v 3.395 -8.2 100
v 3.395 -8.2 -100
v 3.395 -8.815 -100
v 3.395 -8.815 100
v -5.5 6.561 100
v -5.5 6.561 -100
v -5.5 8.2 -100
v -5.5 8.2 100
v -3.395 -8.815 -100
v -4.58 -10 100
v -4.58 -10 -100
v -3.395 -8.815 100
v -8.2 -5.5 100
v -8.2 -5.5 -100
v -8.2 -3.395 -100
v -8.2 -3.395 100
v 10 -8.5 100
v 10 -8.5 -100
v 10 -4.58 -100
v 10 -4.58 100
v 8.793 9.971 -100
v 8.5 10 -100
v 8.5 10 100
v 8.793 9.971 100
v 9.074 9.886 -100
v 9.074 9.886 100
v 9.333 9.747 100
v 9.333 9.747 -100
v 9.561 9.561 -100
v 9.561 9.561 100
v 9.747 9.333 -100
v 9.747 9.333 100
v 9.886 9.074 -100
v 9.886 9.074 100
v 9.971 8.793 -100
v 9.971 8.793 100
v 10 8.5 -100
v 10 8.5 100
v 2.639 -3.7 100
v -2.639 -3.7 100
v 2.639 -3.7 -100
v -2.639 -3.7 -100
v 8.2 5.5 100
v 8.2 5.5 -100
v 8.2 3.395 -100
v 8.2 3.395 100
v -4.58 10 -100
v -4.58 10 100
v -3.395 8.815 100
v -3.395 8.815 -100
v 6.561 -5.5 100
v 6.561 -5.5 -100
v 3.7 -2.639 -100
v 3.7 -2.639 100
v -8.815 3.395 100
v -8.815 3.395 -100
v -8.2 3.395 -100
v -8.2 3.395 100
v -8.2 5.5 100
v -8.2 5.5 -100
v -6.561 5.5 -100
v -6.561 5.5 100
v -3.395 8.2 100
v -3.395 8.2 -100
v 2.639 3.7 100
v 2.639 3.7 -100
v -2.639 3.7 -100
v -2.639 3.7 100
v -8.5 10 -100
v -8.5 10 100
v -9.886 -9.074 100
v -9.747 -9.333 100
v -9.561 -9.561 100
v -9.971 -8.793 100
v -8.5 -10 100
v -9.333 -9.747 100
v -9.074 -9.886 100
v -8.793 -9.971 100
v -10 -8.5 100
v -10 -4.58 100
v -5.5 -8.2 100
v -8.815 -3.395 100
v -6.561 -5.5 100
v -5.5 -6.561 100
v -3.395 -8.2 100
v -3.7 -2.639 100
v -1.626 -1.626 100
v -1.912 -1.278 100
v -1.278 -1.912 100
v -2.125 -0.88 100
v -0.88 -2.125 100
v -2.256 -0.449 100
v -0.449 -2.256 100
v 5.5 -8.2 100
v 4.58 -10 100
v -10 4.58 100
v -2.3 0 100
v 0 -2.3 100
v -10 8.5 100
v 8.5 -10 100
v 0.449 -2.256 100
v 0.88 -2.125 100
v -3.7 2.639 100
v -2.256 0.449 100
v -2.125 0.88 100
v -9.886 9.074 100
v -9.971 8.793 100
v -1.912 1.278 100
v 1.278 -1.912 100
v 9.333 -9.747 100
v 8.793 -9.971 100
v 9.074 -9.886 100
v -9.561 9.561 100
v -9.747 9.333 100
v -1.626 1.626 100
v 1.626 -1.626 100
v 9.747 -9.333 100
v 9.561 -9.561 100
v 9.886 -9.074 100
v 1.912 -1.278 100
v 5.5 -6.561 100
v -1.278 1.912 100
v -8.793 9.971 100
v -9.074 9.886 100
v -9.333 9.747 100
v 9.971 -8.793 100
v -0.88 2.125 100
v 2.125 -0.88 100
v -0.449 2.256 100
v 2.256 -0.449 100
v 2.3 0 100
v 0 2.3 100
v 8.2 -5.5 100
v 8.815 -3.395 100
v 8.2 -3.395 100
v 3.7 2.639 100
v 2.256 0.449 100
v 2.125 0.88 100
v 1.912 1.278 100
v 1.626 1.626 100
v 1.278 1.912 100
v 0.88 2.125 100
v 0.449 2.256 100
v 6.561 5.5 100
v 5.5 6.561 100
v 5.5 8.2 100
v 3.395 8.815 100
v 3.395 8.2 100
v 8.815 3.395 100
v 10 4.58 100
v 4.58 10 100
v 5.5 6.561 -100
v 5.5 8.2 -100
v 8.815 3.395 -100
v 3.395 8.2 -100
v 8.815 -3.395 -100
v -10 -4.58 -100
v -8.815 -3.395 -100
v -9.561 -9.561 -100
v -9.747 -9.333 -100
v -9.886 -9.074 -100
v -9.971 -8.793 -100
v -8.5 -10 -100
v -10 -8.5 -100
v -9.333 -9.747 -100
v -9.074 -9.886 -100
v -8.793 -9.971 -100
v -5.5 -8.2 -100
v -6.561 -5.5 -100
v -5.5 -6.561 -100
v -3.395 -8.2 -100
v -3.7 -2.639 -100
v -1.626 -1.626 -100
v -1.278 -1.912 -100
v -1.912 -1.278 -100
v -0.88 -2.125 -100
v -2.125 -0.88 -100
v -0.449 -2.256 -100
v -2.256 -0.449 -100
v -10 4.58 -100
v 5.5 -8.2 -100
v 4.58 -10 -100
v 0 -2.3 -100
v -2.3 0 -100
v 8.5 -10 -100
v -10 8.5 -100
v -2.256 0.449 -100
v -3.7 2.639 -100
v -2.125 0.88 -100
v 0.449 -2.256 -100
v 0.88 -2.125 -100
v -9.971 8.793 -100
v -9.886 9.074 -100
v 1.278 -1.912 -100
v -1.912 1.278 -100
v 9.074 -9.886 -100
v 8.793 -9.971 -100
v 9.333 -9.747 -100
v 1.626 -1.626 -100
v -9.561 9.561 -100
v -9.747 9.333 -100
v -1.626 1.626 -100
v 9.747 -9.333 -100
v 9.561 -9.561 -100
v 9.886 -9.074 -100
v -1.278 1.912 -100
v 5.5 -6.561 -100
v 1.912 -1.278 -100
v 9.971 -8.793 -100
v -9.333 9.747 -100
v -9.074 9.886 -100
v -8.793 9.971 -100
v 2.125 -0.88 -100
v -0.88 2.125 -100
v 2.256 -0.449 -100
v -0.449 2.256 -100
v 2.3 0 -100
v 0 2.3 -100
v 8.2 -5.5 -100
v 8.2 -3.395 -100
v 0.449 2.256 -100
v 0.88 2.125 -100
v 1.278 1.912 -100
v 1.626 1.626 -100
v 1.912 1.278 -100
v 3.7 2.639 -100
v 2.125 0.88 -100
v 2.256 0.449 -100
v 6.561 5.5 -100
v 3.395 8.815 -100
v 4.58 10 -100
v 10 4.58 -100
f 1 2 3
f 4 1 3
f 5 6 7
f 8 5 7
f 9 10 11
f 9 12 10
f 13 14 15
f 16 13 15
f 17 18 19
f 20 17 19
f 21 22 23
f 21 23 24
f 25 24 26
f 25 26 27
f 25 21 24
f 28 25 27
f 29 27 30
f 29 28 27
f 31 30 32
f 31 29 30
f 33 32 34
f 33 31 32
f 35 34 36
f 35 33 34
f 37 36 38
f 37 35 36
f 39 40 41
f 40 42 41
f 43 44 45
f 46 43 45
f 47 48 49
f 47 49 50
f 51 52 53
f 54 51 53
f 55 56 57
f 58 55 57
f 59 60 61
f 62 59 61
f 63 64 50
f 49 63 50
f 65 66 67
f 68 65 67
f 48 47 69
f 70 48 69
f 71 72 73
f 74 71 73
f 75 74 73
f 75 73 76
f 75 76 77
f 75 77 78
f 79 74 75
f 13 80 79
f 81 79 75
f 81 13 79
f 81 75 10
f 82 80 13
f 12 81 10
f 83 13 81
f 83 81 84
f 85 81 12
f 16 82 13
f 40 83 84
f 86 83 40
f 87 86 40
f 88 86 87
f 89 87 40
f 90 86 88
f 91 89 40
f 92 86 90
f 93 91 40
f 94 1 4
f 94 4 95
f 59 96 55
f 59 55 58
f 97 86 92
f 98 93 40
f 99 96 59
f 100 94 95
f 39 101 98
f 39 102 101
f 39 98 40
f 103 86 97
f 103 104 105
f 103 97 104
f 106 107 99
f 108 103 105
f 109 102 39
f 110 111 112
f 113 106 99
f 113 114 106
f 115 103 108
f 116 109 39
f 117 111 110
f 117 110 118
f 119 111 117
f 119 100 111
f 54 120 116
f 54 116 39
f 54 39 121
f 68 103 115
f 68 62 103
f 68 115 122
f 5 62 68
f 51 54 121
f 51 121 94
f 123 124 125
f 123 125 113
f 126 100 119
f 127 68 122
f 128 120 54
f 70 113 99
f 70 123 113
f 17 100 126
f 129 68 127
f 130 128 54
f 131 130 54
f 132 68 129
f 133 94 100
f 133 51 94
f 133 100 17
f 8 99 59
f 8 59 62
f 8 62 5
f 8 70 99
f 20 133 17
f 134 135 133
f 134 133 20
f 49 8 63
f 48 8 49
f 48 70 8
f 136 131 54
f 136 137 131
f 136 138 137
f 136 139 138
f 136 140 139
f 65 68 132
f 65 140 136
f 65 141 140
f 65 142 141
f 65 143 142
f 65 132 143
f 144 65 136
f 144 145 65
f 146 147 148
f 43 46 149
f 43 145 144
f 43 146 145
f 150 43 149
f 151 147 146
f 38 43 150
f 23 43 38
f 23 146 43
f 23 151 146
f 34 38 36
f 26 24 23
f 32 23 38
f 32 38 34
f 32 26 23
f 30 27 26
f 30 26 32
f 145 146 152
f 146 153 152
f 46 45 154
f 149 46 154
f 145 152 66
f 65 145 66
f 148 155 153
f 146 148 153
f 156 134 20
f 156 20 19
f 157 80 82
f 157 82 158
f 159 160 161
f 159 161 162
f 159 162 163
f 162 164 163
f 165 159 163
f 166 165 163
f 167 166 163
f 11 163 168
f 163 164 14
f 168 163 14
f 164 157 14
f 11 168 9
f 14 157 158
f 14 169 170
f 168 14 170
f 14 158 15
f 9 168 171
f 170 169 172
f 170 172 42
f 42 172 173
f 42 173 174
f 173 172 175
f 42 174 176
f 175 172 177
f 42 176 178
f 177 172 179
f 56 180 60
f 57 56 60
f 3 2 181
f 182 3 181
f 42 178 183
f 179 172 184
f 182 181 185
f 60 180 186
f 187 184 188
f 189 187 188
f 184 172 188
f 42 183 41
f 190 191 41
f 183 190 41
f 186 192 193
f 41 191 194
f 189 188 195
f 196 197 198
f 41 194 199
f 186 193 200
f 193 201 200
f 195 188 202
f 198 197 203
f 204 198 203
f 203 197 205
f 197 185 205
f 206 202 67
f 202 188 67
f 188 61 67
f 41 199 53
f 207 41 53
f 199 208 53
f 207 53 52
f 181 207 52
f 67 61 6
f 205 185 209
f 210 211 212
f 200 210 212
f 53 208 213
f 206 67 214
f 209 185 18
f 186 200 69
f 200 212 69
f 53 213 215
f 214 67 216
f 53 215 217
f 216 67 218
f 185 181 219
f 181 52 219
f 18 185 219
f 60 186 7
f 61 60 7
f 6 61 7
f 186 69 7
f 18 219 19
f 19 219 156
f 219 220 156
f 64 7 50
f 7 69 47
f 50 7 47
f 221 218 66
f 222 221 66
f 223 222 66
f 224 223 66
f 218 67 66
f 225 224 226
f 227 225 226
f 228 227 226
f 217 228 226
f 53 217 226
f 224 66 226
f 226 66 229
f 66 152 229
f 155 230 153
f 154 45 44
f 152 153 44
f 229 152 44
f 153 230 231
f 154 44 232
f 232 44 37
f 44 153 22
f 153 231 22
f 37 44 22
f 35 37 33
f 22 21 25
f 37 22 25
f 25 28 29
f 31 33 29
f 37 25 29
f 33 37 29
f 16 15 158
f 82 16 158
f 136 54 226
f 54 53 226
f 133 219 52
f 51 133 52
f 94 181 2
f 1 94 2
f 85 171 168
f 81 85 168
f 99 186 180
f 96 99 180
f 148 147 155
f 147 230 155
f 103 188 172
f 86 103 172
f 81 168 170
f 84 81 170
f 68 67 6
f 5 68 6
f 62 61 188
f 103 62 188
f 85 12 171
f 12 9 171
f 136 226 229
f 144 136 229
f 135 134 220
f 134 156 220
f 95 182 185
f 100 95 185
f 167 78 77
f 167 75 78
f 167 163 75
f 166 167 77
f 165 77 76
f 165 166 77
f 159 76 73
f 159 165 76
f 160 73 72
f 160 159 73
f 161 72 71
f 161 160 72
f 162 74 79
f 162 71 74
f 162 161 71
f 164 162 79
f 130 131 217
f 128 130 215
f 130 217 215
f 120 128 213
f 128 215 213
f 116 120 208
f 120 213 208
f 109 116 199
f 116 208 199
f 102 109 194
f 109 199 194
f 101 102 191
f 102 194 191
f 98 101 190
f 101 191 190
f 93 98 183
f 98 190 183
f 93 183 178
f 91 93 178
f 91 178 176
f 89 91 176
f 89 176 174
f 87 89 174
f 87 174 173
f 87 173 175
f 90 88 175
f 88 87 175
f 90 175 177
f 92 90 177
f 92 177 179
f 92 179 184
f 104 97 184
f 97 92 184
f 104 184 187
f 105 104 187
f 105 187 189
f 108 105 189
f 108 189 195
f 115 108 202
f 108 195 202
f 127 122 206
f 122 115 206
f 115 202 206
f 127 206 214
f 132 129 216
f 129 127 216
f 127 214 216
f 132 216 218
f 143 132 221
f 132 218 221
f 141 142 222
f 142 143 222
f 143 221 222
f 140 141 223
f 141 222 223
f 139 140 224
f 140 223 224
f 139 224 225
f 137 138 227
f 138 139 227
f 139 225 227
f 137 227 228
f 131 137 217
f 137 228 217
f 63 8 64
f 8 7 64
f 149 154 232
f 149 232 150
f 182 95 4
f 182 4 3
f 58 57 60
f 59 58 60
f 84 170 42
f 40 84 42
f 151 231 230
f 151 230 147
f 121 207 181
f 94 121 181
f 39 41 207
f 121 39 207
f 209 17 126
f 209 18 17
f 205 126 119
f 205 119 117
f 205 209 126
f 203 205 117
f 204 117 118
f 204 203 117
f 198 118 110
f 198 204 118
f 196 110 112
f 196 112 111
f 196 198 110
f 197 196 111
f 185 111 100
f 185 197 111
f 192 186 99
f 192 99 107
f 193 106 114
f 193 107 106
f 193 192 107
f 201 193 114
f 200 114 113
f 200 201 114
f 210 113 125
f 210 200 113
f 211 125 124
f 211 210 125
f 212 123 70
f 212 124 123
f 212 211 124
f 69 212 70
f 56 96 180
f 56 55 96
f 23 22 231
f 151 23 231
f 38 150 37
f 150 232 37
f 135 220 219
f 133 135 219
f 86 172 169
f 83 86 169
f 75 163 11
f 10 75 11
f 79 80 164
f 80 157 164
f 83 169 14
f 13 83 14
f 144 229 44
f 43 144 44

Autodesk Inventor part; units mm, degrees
ref_plane "YZ Plane" through (0, 0, 0) normal (1, 0, 0) x (0, 1, 0)
ref_plane "XZ Plane" through (0, 0, 0) normal (0, 1, 0) x (-1, 0, 0)
ref_plane "XY Plane" through (0, 0, 0) normal (0, 0, 1) x (1, 0, 0)
sketch "Sketch1" plane through (0, 0, 0) normal (0, 0, 1) x (1, 0, 0)
  line L0 (0, 3.7) -> (-2.6393, 3.7)
  line L1 (-2.6393, 3.7) -> (-5.5, 6.5607)
  line L2 (-5.5, 6.5607) -> (-5.5, 8.2)
  line L3 (-5.5, 8.2) -> (-3.395, 8.2)
  line L4 (-3.395, 8.2) -> (-3.395, 10)
  line L5 (-3.395, 10) -> (-10, 10)
  line L6 (-10, 10) -> (-10, 3.395)
  line L7 (-10, 3.395) -> (-8.2, 3.395)
  line L8 (-8.2, 3.395) -> (-8.2, 5.5)
  line L9 (-8.2, 5.5) -> (-6.5607, 5.5)
  line L10 (-6.5607, 5.5) -> (-3.7, 2.6393)
  line L11 (-3.7, 2.6393) -> (-3.7, 0)
  line L12 (0, 0) -> (-10, 10) construction
  circle A0 centre (0, 0) radius 2.3
  line L13 (-22.6601, 0) -> (65.9605, 0) projected
  line L14 (-3.7, 0) -> (0, 0)
  line L15 (0, 0) -> (0, 3.7)
  line L16 (11.2521, 18.9743) -> (53.3004, 18.9743) construction
  line L17 (53.3004, 18.9743) -> (53.3004, -5.624) construction
  line L18 (53.3004, -5.624) -> (11.2521, -5.624) construction
  line L19 (11.2521, -5.624) -> (11.2521, 18.9743) construction
  point P0 (-2.3, 0)
  point P1 (0, 2.3)
  dimension "d0" = 1.5
  dimension "d6" = 6.3
  dimension "d9" = 4.6
  dimension "d18" = 135
  dimension "d22" = 20
  dimension "d34" = 11
  dimension "d35" = 6.79
  dimension "d36" = 1.8
extrude "Extrusion1" add sketch "Sketch1" along normal mid plane 200 contours L15 A0 L13 L11 L10 L9 L8 L7 L6 L5 L4 L3 L2 L1 L0
pattern_circular "Circular Pattern1" count 4 over 360 about axis through (0, 0, -10) along (0, 0, 1) of "Extrusion1"
chamfer "Chamfer1" distance 1.185 angle 45 8 edges at (-3.395, 10, 0) (3.395, 10, 0) (10, 3.395, 0) (10, -3.395, 0) (3.395, -10, 0) (-3.395, -10, 0) (-10, -3.395, 0) (-10, 3.395, 0)
fillet "Fillet1" radius 1.5 4 edges at (-10, 10, 0) (10, 10, 0) (-10, -10, 0) (10, -10, 0)
properties part number "2020aluminum_extrusion_black" material "Aluminum 6061"
